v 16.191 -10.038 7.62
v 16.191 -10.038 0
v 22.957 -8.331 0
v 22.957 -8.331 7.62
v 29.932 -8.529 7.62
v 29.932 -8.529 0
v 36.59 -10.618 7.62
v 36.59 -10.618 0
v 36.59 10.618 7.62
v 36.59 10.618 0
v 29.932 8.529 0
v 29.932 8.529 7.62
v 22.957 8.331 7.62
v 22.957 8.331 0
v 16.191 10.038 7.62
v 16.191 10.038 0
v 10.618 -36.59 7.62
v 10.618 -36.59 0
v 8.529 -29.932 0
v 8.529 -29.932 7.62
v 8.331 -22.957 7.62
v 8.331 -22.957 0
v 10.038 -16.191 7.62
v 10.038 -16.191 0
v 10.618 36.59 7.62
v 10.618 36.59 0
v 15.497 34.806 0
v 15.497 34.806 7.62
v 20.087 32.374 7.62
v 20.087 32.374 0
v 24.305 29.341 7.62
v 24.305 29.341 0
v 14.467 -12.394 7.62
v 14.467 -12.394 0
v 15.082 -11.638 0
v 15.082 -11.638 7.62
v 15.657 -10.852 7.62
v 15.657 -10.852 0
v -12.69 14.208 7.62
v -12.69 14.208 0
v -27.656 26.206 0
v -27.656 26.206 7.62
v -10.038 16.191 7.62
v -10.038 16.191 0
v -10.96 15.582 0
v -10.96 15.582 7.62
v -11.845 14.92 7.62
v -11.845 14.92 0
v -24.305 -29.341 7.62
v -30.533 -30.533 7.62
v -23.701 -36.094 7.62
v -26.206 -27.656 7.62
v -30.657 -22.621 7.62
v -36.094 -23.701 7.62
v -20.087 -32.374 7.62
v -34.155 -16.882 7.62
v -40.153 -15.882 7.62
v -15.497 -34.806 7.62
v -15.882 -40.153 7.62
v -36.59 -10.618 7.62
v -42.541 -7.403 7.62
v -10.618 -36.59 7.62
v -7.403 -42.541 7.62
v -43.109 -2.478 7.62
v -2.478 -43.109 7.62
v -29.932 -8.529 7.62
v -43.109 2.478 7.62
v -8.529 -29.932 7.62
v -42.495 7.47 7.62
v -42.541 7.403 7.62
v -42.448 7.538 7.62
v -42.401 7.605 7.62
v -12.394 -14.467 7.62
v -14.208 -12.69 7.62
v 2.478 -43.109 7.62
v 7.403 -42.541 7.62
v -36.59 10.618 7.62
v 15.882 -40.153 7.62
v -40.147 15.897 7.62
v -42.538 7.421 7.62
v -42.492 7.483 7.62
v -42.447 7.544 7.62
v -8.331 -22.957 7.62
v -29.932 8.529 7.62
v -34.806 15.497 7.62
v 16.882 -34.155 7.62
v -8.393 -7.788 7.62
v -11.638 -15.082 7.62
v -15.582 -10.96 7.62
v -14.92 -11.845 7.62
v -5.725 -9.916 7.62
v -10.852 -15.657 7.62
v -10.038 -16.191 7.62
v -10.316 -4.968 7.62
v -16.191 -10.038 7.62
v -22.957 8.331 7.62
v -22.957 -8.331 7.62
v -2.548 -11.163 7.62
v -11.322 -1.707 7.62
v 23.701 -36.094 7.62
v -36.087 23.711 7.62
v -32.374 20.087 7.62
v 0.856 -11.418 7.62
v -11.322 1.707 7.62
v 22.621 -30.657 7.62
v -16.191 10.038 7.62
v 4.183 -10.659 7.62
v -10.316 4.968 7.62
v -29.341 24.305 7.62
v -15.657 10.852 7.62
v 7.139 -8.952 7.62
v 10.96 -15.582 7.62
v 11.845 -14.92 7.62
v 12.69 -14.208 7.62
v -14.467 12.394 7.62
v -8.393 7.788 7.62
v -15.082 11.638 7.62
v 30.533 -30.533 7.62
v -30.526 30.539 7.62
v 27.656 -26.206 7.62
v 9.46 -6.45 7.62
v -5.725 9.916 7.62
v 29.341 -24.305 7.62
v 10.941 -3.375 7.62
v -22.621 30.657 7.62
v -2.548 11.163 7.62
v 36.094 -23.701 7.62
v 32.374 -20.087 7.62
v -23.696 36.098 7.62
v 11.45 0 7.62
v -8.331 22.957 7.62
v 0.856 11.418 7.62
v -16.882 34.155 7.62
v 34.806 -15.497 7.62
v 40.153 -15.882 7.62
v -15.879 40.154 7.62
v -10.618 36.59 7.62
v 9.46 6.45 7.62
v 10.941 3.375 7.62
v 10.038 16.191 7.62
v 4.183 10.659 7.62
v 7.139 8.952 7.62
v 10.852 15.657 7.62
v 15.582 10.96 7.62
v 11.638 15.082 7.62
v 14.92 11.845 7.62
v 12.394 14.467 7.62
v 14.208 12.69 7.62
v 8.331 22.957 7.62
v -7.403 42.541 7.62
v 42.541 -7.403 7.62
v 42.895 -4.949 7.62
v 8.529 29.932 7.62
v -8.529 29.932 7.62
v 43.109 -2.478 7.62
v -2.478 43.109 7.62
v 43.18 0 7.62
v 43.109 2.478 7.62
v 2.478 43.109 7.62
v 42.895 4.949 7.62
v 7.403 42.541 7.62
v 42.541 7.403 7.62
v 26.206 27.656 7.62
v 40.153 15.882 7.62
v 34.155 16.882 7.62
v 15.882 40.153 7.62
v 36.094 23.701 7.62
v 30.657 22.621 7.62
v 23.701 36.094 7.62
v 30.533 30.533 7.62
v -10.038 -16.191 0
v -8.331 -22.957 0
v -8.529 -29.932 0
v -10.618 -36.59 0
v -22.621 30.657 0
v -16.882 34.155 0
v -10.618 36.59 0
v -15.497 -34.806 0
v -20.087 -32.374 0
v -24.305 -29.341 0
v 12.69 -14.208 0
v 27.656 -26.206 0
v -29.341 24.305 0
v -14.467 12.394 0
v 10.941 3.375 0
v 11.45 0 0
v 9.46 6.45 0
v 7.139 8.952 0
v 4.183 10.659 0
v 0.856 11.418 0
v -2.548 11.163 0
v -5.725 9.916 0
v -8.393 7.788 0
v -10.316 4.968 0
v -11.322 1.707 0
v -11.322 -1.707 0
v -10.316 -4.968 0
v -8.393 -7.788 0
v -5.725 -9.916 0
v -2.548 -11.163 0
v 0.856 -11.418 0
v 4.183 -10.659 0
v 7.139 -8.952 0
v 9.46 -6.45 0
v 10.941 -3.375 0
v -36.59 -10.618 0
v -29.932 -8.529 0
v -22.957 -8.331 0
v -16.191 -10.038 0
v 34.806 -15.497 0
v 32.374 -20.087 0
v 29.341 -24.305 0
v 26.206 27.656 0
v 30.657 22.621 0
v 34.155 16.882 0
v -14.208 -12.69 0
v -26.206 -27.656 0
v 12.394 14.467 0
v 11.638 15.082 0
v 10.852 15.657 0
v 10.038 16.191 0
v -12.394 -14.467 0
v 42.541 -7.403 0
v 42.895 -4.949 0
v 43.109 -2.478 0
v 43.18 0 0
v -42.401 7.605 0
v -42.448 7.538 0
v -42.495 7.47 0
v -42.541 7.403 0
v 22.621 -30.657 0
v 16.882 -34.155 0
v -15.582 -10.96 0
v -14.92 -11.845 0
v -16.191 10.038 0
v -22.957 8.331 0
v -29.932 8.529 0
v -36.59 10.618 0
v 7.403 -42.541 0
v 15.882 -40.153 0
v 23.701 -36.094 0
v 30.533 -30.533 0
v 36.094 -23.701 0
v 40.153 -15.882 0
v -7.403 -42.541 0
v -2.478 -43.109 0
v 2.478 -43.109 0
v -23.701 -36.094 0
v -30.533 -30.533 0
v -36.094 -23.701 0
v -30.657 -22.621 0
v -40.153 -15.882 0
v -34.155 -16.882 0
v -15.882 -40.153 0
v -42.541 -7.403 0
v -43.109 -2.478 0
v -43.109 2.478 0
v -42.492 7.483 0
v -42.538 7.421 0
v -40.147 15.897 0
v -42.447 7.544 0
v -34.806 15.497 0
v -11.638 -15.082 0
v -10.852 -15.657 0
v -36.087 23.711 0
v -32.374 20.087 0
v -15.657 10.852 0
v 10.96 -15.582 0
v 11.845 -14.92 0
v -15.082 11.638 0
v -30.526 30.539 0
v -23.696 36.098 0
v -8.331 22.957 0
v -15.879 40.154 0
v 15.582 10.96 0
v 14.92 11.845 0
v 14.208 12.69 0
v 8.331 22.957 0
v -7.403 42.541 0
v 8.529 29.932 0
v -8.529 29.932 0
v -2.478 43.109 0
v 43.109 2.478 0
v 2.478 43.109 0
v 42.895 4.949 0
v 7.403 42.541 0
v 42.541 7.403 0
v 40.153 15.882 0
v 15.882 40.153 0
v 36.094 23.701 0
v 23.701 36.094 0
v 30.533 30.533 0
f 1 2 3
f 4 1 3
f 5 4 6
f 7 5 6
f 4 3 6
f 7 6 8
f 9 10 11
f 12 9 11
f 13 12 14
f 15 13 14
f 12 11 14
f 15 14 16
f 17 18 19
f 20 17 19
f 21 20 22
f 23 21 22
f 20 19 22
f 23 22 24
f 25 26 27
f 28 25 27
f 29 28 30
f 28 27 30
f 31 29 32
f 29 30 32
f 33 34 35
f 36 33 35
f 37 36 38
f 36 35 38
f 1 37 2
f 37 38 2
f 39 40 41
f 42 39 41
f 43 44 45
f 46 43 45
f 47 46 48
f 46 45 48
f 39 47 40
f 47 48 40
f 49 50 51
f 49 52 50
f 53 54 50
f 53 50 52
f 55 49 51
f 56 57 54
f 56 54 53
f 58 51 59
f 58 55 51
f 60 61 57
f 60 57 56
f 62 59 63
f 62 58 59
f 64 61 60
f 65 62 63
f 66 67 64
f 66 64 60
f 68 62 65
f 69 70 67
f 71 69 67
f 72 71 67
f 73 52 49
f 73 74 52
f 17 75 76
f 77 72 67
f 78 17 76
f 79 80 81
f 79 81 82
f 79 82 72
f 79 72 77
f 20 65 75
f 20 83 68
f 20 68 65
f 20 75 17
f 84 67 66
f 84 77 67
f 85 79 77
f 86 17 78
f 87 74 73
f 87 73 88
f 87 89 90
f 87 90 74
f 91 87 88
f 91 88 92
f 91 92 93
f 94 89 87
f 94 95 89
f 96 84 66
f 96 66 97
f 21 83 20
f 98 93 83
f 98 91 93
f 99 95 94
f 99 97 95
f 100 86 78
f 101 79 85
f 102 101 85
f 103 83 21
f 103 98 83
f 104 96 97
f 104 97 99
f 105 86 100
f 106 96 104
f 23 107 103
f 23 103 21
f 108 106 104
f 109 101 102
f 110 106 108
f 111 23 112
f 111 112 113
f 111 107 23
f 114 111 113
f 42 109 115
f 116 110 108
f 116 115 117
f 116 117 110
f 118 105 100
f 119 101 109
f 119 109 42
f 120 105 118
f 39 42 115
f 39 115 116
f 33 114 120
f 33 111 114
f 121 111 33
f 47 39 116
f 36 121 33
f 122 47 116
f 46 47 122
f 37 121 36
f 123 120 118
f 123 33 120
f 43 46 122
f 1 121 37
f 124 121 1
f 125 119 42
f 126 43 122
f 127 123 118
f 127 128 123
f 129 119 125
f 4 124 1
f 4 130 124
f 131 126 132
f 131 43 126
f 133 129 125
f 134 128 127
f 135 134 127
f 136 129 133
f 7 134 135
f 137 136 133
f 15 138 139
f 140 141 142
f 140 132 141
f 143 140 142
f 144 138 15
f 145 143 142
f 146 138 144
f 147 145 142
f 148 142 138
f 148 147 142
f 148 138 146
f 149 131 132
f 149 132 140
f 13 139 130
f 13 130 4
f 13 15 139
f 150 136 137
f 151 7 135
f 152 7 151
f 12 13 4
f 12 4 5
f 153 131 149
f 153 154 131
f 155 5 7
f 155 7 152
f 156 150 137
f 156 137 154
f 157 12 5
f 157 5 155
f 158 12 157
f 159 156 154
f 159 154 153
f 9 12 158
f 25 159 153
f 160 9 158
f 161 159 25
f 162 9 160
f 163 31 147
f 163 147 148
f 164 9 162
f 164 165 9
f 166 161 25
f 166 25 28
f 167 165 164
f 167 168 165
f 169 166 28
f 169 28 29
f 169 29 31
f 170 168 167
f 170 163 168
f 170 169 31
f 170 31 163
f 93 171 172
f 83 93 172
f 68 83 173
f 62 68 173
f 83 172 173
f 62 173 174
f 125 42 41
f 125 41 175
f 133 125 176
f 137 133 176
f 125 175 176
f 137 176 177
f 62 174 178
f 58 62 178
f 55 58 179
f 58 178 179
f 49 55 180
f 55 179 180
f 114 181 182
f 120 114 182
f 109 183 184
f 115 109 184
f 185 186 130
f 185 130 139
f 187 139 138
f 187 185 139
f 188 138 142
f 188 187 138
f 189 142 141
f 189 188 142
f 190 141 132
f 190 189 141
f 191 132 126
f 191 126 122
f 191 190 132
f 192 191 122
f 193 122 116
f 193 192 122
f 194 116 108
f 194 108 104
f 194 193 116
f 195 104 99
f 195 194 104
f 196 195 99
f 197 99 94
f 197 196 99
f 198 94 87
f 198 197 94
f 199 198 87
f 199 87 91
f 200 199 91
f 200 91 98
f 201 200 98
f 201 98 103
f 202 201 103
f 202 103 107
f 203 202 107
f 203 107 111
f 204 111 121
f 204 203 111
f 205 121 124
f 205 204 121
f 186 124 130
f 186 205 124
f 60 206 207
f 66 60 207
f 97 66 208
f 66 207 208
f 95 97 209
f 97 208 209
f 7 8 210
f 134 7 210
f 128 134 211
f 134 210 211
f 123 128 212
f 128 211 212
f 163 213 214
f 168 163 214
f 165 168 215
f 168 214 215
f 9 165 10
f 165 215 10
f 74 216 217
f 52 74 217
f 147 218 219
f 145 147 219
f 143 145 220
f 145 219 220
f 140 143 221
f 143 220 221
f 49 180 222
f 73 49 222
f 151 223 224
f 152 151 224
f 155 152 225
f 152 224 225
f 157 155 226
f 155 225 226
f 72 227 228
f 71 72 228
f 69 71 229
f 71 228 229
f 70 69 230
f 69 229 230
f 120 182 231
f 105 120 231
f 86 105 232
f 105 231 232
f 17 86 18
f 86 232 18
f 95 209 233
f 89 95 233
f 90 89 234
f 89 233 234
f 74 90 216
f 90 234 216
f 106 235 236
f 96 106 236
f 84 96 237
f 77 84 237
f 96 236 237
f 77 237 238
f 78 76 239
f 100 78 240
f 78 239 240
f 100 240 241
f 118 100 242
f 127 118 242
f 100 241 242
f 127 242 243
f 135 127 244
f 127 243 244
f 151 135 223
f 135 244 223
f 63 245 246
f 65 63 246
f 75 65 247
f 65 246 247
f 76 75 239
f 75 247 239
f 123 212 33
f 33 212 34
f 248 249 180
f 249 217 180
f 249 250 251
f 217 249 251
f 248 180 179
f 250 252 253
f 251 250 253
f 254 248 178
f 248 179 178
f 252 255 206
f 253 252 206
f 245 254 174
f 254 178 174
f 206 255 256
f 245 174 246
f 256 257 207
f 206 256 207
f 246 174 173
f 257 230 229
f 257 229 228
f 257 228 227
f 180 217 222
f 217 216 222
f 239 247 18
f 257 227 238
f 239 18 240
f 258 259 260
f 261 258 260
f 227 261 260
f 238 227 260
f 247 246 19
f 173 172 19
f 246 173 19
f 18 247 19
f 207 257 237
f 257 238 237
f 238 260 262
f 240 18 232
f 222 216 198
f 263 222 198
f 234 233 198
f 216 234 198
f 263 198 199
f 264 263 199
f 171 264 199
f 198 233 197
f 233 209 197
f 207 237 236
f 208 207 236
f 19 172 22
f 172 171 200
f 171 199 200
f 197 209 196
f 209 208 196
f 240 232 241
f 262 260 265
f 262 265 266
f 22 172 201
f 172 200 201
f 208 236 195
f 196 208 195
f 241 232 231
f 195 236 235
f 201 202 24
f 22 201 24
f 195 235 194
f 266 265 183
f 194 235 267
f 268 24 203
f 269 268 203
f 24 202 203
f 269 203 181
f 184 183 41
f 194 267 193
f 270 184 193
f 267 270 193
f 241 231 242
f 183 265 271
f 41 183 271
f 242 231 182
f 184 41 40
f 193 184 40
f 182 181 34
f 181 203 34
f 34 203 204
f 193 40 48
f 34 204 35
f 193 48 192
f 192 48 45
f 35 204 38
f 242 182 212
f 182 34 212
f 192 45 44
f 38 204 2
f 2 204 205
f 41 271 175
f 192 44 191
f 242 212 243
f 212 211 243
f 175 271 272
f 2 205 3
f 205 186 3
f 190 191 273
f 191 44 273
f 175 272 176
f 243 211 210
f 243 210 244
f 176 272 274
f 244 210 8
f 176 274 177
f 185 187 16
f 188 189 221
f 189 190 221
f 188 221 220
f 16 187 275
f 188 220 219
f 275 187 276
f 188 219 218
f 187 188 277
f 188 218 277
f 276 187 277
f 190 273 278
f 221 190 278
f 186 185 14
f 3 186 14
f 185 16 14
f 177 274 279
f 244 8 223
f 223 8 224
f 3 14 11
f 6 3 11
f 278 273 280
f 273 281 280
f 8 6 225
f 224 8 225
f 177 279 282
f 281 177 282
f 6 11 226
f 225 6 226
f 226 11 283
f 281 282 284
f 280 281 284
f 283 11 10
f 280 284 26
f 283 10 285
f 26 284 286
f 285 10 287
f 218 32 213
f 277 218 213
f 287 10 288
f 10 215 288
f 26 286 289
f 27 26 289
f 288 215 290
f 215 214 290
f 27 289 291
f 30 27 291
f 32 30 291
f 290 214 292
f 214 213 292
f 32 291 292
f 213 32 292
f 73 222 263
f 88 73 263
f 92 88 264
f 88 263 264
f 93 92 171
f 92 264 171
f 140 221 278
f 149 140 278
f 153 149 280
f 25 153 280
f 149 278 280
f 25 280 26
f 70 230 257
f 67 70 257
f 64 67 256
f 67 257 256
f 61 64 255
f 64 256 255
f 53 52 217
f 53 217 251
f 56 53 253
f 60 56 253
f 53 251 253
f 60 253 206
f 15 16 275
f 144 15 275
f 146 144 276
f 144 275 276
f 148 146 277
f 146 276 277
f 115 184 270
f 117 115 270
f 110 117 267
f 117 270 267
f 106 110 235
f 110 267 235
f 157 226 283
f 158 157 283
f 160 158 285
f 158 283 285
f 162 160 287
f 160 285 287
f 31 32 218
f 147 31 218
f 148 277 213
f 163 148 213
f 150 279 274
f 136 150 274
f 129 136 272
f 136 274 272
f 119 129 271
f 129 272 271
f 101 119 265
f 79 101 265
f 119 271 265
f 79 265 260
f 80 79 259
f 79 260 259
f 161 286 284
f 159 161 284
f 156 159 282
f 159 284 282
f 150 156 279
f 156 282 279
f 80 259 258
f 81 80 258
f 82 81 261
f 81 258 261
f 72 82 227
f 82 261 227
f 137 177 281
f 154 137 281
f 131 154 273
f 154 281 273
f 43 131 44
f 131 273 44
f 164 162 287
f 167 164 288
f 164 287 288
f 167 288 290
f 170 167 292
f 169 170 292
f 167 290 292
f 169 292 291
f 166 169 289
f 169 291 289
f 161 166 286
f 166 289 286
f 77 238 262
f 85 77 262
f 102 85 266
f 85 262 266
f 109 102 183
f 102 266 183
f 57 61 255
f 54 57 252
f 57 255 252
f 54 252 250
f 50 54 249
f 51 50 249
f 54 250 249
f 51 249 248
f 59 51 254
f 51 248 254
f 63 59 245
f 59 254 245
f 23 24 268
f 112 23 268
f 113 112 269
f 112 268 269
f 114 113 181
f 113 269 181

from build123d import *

# Parameters (mm, degrees)
F0_R     = 11.45
F1_DEPTH = 7.62


# Not quite as in the source:
# - a feature names something its author has since deleted; it is built from what else it names


with BuildPart() as f1:
    # F0 (on Top) → F1 (new body)
    with BuildSketch(Plane.XY):
        with BuildLine():
            ThreePointArc((-10.038027058, 16.1907539288), (0, 19.05), (10.038027058, 16.1907539288))
            ThreePointArc((10.038027058, 16.1907539288), (8.1892299167, 26.451450684), (10.618228457, 36.59047997))
            ThreePointArc((10.618228457, 36.59047997), (0, 38.1), (-10.618228457, 36.59047997))
            ThreePointArc((-10.618228457, 36.59047997), (-8.1892299167, 26.451450684), (-10.038027058, 16.1907539288))
        make_face()
        with BuildLine():
            ThreePointArc((16.1907539288, -10.038027058), (18.3212494435, -5.2186510544), (19.05, 0))
            ThreePointArc((19.05, 0), (18.3212494435, 5.2186510544), (16.1907539288, 10.038027058))
            ThreePointArc((16.1907539288, 10.038027058), (15.2571196867, 11.4071380664), (14.208032523, 12.6899295438))
            ThreePointArc((14.208032523, 12.6899295438), (13.3304286547, 13.6089004655), (12.3935124609, 14.4673200311))
            ThreePointArc((12.3935124609, 14.4673200311), (11.2488242673, 15.3742138857), (10.038027058, 16.1907539288))
            ThreePointArc((10.038027058, 16.1907539288), (0, 19.05), (-10.038027058, 16.1907539288))
            ThreePointArc((-10.038027058, 16.1907539288), (-11.4071380664, 15.2571196867), (-12.6899295437, 14.208032523))
            ThreePointArc((-12.6899295437, 14.208032523), (-13.6089004655, 13.3304286548), (-14.467320031, 12.3935124609))
            ThreePointArc((-14.467320031, 12.3935124609), (-15.3742138857, 11.2488242673), (-16.1907539288, 10.038027058))
            ThreePointArc((-16.1907539288, 10.038027058), (-19.05, 0), (-16.1907539288, -10.038027058))
            ThreePointArc((-16.1907539288, -10.038027058), (-15.2571196867, -11.4071380664), (-14.208032523, -12.6899295437))
            ThreePointArc((-14.208032523, -12.6899295437), (-13.3304286548, -13.6089004655), (-12.3935124609, -14.467320031))
            ThreePointArc((-12.3935124609, -14.467320031), (-11.2488242673, -15.3742138857), (-10.038027058, -16.1907539288))
            ThreePointArc((-10.038027058, -16.1907539288), (0, -19.05), (10.038027058, -16.1907539288))
            ThreePointArc((10.038027058, -16.1907539288), (11.4071380664, -15.2571196867), (12.6899295438, -14.208032523))
            ThreePointArc((12.6899295438, -14.208032523), (13.6089004655, -13.3304286547), (14.4673200311, -12.3935124609))
            ThreePointArc((14.4673200311, -12.3935124609), (15.3742138857, -11.2488242673), (16.1907539288, -10.038027058))
        make_face()
        Circle(F0_R, mode=Mode.SUBTRACT)
        with BuildLine():
            ThreePointArc((-10.618228457, 36.59047997), (0, 38.1), (10.618228457, 36.59047997))
            ThreePointArc((10.618228457, 36.59047997), (10.9631553547, 37.2915593412), (11.3294826074, 37.9816978733))
            ThreePointArc((11.3294826074, 37.9816978733), (9.6714472488, 40.5242467677), (7.4026469551, 42.5407242305))
            ThreePointArc((7.4026469551, 42.5407242305), (0, 43.18), (-7.4026469551, 42.5407242305))
            ThreePointArc((-7.4026469551, 42.5407242305), (-9.6714472488, 40.5242467677), (-11.3294826074, 37.9816978733))
            ThreePointArc((-11.3294826074, 37.9816978733), (-10.9631553547, 37.2915593412), (-10.618228457, 36.59047997))
        make_face()
        with BuildLine():
            ThreePointArc((-27.6564265836, 26.2055732359), (-19.8292429656, 32.5332310632), (-10.618228457, 36.59047997))
            ThreePointArc((-10.618228457, 36.59047997), (-10.9631553547, 37.2915593412), (-11.3294826074, 37.9816978733))
            ThreePointArc((-11.3294826074, 37.9816978733), (-9.6714472488, 40.5242467677), (-7.4026469551, 42.5407242305))
            ThreePointArc((-7.4026469551, 42.5407242305), (-30.5262465043, 30.5394936821), (-42.5375084691, 7.4211032363))
            ThreePointArc((-42.5375084691, 7.4211032363), (-42.4698240182, 7.5132687267), (-42.401220917, 7.6047524795))
            ThreePointArc((-42.401220917, 7.6047524795), (-40.430781391, 9.7510814924), (-37.9816978733, 11.3294826074))
            ThreePointArc((-37.9816978733, 11.3294826074), (-37.2915593412, 10.9631553547), (-36.59047997, 10.618228457))
            ThreePointArc((-36.59047997, 10.618228457), (-33.6685368778, 17.8336654815), (-29.3410352271, 24.3046014533))
            ThreePointArc((-29.3410352271, 24.3046014533), (-28.5145767397, 25.2691296517), (-27.6564265836, 26.2055732359))
        make_face()
        with BuildLine():
            ThreePointArc((-11.3294826074, -37.9816978733), (-10.9631553547, -37.2915593412), (-10.618228457, -36.59047997))
            ThreePointArc((-10.618228457, -36.59047997), (-17.8336654815, -33.6685368778), (-24.3046014533, -29.3410352271))
            ThreePointArc((-24.3046014533, -29.3410352271), (-25.2691296517, -28.5145767397), (-26.2055732359, -27.6564265836))
            ThreePointArc((-26.2055732359, -27.6564265836), (-32.5332310632, -19.8292429656), (-36.59047997, -10.618228457))
            ThreePointArc((-36.59047997, -10.618228457), (-37.2915593412, -10.9631553547), (-37.9816978733, -11.3294826074))
            ThreePointArc((-37.9816978733, -11.3294826074), (-40.5242467677, -9.6714472488), (-42.5407242305, -7.4026469551))
            ThreePointArc((-42.5407242305, -7.4026469551), (-30.5328708116, -30.5328708116), (-7.4026469551, -42.5407242305))
            ThreePointArc((-7.4026469551, -42.5407242305), (-9.6714472488, -40.5242467677), (-11.3294826074, -37.9816978733))
        make_face()
        with BuildLine():
            Line((-24.3046014533, -29.3410352271), (-12.3935124609, -14.467320031))
            ThreePointArc((-12.3935124609, -14.467320031), (-13.3304286548, -13.6089004655), (-14.208032523, -12.6899295437))
            Line((-14.208032523, -12.6899295437), (-26.2055732359, -27.6564265836))
            ThreePointArc((-26.2055732359, -27.6564265836), (-25.2691296517, -28.5145767397), (-24.3046014533, -29.3410352271))
        make_face()
        with BuildLine():
            ThreePointArc((10.6182284569, -36.59047997), (8.1892299167, -26.451450684), (10.038027058, -16.1907539288))
            ThreePointArc((10.038027058, -16.1907539288), (0, -19.05), (-10.038027058, -16.1907539288))
            ThreePointArc((-10.038027058, -16.1907539288), (-8.1892299167, -26.451450684), (-10.618228457, -36.59047997))
            ThreePointArc((-10.618228457, -36.59047997), (0, -38.1), (10.6182284569, -36.59047997))
        make_face()
        with BuildLine():
            ThreePointArc((11.3294826074, -37.9816978733), (10.9631553547, -37.2915593412), (10.6182284569, -36.59047997))
            ThreePointArc((10.6182284569, -36.59047997), (0, -38.1), (-10.618228457, -36.59047997))
            ThreePointArc((-10.618228457, -36.59047997), (-10.9631553547, -37.2915593412), (-11.3294826074, -37.9816978733))
            ThreePointArc((-11.3294826074, -37.9816978733), (-9.6714472488, -40.5242467677), (-7.4026469551, -42.5407242305))
            ThreePointArc((-7.4026469551, -42.5407242305), (0, -43.18), (7.4026469551, -42.5407242305))
            ThreePointArc((7.4026469551, -42.5407242305), (9.6714472488, -40.5242467677), (11.3294826074, -37.9816978733))
        make_face()
        with BuildLine():
            ThreePointArc((37.9816978733, 11.3294826074), (37.2915593412, 10.9631553547), (36.59047997, 10.6182284569))
            ThreePointArc((36.59047997, 10.6182284569), (37.7207322759, 5.3624953679), (38.1, 0))
            ThreePointArc((38.1, 0), (37.7207322759, -5.3624953679), (36.59047997, -10.618228457))
            ThreePointArc((36.59047997, -10.618228457), (37.2915593412, -10.9631553547), (37.9816978733, -11.3294826074))
            ThreePointArc((37.9816978733, -11.3294826074), (40.5242467677, -9.6714472488), (42.5407242305, -7.4026469551))
            ThreePointArc((42.5407242305, -7.4026469551), (43.0198841948, -3.7150994419), (43.18, 0))
            ThreePointArc((43.18, 0), (43.0198841948, 3.7150994419), (42.5407242305, 7.4026469551))
            ThreePointArc((42.5407242305, 7.4026469551), (40.5242467677, 9.6714472488), (37.9816978733, 11.3294826074))
        make_face()
        with BuildLine():
            ThreePointArc((16.1907539288, 10.038027058), (18.3212494435, 5.2186510544), (19.05, 0))
            ThreePointArc((19.05, 0), (18.3212494435, -5.2186510544), (16.1907539288, -10.038027058))
            ThreePointArc((16.1907539288, -10.038027058), (26.451450684, -8.1892299167), (36.59047997, -10.618228457))
            ThreePointArc((36.59047997, -10.618228457), (37.7207322759, -5.3624953679), (38.1, 0))
            ThreePointArc((38.1, 0), (37.7207322759, 5.3624953679), (36.59047997, 10.6182284569))
            ThreePointArc((36.59047997, 10.6182284569), (26.451450684, 8.1892299167), (16.1907539288, 10.038027058))
        make_face()
        with BuildLine():
            Line((29.3410352271, -24.3046014533), (14.467320031, -12.3935124609))
            ThreePointArc((14.4673200311, -12.3935124609), (13.6089004655, -13.3304286547), (12.6899295438, -14.208032523))
            Line((12.6899295437, -14.208032523), (27.6564265836, -26.2055732359))
            ThreePointArc((27.6564265836, -26.2055732359), (28.5145767397, -25.2691296517), (29.3410352271, -24.3046014533))
        make_face()
        with BuildLine():
            ThreePointArc((-14.467320031, 12.3935124609), (-13.6089004655, 13.3304286548), (-12.6899295437, 14.208032523))
            Line((-12.6899295437, 14.208032523), (-27.6564265836, 26.2055732359))
            ThreePointArc((-27.6564265836, 26.2055732359), (-28.5145767397, 25.2691296517), (-29.3410352271, 24.3046014533))
            Line((-29.3410352271, 24.3046014533), (-14.467320031, 12.3935124609))
        make_face()
        with BuildLine():
            ThreePointArc((12.3935124609, 14.4673200311), (13.3304286547, 13.6089004655), (14.208032523, 12.6899295438))
            Line((14.208032523, 12.6899295438), (26.2055732359, 27.6564265836))
            ThreePointArc((26.2055732359, 27.6564265836), (25.2691296517, 28.5145767397), (24.3046014533, 29.3410352271))
            Line((24.3046014533, 29.3410352271), (12.3935124609, 14.4673200311))
        make_face()
        with BuildLine():
            ThreePointArc((37.9816978733, -11.3294826074), (37.2915593412, -10.9631553547), (36.59047997, -10.618228457))
            ThreePointArc((36.59047997, -10.618228457), (33.6685368778, -17.8336654815), (29.3410352271, -24.3046014533))
            ThreePointArc((29.3410352271, -24.3046014533), (28.5145767397, -25.2691296517), (27.6564265836, -26.2055732359))
            ThreePointArc((27.6564265836, -26.2055732359), (19.8292429656, -32.5332310632), (10.6182284569, -36.59047997))
            ThreePointArc((10.6182284569, -36.59047997), (10.9631553547, -37.2915593412), (11.3294826074, -37.9816978733))
            ThreePointArc((11.3294826074, -37.9816978733), (9.6714472488, -40.5242467677), (7.4026469551, -42.5407242305))
            ThreePointArc((7.4026469551, -42.5407242305), (30.5328708116, -30.5328708116), (42.5407242305, -7.4026469551))
            ThreePointArc((42.5407242305, -7.4026469551), (40.5242467677, -9.6714472488), (37.9816978733, -11.3294826074))
        make_face()
        with BuildLine():
            ThreePointArc((26.2055732359, 27.6564265836), (32.5332310632, 19.8292429656), (36.59047997, 10.6182284569))
            ThreePointArc((36.59047997, 10.6182284569), (37.2915593412, 10.9631553547), (37.9816978733, 11.3294826074))
            ThreePointArc((37.9816978733, 11.3294826074), (40.5242467677, 9.6714472488), (42.5407242305, 7.4026469551))
            ThreePointArc((42.5407242305, 7.4026469551), (30.5328708116, 30.5328708116), (7.4026469551, 42.5407242305))
            ThreePointArc((7.4026469551, 42.5407242305), (9.6714472488, 40.5242467677), (11.3294826074, 37.9816978733))
            ThreePointArc((11.3294826074, 37.9816978733), (10.9631553547, 37.2915593412), (10.618228457, 36.59047997))
            ThreePointArc((10.618228457, 36.59047997), (17.8336654815, 33.6685368778), (24.3046014533, 29.3410352271))
            ThreePointArc((24.3046014533, 29.3410352271), (25.2691296517, 28.5145767397), (26.2055732359, 27.6564265836))
        make_face()
        with BuildLine():
            ThreePointArc((-16.1907539288, -10.038027058), (-19.05, 0), (-16.1907539288, 10.038027058))
            ThreePointArc((-16.1907539288, 10.038027058), (-26.451450684, 8.1892299167), (-36.59047997, 10.618228457))
            ThreePointArc((-36.59047997, 10.618228457), (-38.1, 0), (-36.59047997, -10.618228457))
            ThreePointArc((-36.59047997, -10.618228457), (-26.451450684, -8.1892299167), (-16.1907539288, -10.038027058))
        make_face()
        with BuildLine():
            ThreePointArc((-42.5407242305, 7.4026469551), (-43.18, 0), (-42.5407242305, -7.4026469551))
            ThreePointArc((-42.5407242305, -7.4026469551), (-40.5242467677, -9.6714472488), (-37.9816978733, -11.3294826074))
            ThreePointArc((-37.9816978733, -11.3294826074), (-37.2915593412, -10.9631553547), (-36.59047997, -10.618228457))
            ThreePointArc((-36.59047997, -10.618228457), (-38.1, 0), (-36.59047997, 10.618228457))
            ThreePointArc((-36.59047997, 10.618228457), (-37.2915593412, 10.9631553547), (-37.9816978733, 11.3294826074))
            ThreePointArc((-37.9816978733, 11.3294826074), (-40.430781391, 9.7510814924), (-42.401220917, 7.6047524795))
            ThreePointArc((-42.401220917, 7.6047524795), (-42.4715153756, 7.5040743862), (-42.5407242305, 7.4026469551))
        make_face()
    extrude(amount=F1_DEPTH)


solid = f1.part
